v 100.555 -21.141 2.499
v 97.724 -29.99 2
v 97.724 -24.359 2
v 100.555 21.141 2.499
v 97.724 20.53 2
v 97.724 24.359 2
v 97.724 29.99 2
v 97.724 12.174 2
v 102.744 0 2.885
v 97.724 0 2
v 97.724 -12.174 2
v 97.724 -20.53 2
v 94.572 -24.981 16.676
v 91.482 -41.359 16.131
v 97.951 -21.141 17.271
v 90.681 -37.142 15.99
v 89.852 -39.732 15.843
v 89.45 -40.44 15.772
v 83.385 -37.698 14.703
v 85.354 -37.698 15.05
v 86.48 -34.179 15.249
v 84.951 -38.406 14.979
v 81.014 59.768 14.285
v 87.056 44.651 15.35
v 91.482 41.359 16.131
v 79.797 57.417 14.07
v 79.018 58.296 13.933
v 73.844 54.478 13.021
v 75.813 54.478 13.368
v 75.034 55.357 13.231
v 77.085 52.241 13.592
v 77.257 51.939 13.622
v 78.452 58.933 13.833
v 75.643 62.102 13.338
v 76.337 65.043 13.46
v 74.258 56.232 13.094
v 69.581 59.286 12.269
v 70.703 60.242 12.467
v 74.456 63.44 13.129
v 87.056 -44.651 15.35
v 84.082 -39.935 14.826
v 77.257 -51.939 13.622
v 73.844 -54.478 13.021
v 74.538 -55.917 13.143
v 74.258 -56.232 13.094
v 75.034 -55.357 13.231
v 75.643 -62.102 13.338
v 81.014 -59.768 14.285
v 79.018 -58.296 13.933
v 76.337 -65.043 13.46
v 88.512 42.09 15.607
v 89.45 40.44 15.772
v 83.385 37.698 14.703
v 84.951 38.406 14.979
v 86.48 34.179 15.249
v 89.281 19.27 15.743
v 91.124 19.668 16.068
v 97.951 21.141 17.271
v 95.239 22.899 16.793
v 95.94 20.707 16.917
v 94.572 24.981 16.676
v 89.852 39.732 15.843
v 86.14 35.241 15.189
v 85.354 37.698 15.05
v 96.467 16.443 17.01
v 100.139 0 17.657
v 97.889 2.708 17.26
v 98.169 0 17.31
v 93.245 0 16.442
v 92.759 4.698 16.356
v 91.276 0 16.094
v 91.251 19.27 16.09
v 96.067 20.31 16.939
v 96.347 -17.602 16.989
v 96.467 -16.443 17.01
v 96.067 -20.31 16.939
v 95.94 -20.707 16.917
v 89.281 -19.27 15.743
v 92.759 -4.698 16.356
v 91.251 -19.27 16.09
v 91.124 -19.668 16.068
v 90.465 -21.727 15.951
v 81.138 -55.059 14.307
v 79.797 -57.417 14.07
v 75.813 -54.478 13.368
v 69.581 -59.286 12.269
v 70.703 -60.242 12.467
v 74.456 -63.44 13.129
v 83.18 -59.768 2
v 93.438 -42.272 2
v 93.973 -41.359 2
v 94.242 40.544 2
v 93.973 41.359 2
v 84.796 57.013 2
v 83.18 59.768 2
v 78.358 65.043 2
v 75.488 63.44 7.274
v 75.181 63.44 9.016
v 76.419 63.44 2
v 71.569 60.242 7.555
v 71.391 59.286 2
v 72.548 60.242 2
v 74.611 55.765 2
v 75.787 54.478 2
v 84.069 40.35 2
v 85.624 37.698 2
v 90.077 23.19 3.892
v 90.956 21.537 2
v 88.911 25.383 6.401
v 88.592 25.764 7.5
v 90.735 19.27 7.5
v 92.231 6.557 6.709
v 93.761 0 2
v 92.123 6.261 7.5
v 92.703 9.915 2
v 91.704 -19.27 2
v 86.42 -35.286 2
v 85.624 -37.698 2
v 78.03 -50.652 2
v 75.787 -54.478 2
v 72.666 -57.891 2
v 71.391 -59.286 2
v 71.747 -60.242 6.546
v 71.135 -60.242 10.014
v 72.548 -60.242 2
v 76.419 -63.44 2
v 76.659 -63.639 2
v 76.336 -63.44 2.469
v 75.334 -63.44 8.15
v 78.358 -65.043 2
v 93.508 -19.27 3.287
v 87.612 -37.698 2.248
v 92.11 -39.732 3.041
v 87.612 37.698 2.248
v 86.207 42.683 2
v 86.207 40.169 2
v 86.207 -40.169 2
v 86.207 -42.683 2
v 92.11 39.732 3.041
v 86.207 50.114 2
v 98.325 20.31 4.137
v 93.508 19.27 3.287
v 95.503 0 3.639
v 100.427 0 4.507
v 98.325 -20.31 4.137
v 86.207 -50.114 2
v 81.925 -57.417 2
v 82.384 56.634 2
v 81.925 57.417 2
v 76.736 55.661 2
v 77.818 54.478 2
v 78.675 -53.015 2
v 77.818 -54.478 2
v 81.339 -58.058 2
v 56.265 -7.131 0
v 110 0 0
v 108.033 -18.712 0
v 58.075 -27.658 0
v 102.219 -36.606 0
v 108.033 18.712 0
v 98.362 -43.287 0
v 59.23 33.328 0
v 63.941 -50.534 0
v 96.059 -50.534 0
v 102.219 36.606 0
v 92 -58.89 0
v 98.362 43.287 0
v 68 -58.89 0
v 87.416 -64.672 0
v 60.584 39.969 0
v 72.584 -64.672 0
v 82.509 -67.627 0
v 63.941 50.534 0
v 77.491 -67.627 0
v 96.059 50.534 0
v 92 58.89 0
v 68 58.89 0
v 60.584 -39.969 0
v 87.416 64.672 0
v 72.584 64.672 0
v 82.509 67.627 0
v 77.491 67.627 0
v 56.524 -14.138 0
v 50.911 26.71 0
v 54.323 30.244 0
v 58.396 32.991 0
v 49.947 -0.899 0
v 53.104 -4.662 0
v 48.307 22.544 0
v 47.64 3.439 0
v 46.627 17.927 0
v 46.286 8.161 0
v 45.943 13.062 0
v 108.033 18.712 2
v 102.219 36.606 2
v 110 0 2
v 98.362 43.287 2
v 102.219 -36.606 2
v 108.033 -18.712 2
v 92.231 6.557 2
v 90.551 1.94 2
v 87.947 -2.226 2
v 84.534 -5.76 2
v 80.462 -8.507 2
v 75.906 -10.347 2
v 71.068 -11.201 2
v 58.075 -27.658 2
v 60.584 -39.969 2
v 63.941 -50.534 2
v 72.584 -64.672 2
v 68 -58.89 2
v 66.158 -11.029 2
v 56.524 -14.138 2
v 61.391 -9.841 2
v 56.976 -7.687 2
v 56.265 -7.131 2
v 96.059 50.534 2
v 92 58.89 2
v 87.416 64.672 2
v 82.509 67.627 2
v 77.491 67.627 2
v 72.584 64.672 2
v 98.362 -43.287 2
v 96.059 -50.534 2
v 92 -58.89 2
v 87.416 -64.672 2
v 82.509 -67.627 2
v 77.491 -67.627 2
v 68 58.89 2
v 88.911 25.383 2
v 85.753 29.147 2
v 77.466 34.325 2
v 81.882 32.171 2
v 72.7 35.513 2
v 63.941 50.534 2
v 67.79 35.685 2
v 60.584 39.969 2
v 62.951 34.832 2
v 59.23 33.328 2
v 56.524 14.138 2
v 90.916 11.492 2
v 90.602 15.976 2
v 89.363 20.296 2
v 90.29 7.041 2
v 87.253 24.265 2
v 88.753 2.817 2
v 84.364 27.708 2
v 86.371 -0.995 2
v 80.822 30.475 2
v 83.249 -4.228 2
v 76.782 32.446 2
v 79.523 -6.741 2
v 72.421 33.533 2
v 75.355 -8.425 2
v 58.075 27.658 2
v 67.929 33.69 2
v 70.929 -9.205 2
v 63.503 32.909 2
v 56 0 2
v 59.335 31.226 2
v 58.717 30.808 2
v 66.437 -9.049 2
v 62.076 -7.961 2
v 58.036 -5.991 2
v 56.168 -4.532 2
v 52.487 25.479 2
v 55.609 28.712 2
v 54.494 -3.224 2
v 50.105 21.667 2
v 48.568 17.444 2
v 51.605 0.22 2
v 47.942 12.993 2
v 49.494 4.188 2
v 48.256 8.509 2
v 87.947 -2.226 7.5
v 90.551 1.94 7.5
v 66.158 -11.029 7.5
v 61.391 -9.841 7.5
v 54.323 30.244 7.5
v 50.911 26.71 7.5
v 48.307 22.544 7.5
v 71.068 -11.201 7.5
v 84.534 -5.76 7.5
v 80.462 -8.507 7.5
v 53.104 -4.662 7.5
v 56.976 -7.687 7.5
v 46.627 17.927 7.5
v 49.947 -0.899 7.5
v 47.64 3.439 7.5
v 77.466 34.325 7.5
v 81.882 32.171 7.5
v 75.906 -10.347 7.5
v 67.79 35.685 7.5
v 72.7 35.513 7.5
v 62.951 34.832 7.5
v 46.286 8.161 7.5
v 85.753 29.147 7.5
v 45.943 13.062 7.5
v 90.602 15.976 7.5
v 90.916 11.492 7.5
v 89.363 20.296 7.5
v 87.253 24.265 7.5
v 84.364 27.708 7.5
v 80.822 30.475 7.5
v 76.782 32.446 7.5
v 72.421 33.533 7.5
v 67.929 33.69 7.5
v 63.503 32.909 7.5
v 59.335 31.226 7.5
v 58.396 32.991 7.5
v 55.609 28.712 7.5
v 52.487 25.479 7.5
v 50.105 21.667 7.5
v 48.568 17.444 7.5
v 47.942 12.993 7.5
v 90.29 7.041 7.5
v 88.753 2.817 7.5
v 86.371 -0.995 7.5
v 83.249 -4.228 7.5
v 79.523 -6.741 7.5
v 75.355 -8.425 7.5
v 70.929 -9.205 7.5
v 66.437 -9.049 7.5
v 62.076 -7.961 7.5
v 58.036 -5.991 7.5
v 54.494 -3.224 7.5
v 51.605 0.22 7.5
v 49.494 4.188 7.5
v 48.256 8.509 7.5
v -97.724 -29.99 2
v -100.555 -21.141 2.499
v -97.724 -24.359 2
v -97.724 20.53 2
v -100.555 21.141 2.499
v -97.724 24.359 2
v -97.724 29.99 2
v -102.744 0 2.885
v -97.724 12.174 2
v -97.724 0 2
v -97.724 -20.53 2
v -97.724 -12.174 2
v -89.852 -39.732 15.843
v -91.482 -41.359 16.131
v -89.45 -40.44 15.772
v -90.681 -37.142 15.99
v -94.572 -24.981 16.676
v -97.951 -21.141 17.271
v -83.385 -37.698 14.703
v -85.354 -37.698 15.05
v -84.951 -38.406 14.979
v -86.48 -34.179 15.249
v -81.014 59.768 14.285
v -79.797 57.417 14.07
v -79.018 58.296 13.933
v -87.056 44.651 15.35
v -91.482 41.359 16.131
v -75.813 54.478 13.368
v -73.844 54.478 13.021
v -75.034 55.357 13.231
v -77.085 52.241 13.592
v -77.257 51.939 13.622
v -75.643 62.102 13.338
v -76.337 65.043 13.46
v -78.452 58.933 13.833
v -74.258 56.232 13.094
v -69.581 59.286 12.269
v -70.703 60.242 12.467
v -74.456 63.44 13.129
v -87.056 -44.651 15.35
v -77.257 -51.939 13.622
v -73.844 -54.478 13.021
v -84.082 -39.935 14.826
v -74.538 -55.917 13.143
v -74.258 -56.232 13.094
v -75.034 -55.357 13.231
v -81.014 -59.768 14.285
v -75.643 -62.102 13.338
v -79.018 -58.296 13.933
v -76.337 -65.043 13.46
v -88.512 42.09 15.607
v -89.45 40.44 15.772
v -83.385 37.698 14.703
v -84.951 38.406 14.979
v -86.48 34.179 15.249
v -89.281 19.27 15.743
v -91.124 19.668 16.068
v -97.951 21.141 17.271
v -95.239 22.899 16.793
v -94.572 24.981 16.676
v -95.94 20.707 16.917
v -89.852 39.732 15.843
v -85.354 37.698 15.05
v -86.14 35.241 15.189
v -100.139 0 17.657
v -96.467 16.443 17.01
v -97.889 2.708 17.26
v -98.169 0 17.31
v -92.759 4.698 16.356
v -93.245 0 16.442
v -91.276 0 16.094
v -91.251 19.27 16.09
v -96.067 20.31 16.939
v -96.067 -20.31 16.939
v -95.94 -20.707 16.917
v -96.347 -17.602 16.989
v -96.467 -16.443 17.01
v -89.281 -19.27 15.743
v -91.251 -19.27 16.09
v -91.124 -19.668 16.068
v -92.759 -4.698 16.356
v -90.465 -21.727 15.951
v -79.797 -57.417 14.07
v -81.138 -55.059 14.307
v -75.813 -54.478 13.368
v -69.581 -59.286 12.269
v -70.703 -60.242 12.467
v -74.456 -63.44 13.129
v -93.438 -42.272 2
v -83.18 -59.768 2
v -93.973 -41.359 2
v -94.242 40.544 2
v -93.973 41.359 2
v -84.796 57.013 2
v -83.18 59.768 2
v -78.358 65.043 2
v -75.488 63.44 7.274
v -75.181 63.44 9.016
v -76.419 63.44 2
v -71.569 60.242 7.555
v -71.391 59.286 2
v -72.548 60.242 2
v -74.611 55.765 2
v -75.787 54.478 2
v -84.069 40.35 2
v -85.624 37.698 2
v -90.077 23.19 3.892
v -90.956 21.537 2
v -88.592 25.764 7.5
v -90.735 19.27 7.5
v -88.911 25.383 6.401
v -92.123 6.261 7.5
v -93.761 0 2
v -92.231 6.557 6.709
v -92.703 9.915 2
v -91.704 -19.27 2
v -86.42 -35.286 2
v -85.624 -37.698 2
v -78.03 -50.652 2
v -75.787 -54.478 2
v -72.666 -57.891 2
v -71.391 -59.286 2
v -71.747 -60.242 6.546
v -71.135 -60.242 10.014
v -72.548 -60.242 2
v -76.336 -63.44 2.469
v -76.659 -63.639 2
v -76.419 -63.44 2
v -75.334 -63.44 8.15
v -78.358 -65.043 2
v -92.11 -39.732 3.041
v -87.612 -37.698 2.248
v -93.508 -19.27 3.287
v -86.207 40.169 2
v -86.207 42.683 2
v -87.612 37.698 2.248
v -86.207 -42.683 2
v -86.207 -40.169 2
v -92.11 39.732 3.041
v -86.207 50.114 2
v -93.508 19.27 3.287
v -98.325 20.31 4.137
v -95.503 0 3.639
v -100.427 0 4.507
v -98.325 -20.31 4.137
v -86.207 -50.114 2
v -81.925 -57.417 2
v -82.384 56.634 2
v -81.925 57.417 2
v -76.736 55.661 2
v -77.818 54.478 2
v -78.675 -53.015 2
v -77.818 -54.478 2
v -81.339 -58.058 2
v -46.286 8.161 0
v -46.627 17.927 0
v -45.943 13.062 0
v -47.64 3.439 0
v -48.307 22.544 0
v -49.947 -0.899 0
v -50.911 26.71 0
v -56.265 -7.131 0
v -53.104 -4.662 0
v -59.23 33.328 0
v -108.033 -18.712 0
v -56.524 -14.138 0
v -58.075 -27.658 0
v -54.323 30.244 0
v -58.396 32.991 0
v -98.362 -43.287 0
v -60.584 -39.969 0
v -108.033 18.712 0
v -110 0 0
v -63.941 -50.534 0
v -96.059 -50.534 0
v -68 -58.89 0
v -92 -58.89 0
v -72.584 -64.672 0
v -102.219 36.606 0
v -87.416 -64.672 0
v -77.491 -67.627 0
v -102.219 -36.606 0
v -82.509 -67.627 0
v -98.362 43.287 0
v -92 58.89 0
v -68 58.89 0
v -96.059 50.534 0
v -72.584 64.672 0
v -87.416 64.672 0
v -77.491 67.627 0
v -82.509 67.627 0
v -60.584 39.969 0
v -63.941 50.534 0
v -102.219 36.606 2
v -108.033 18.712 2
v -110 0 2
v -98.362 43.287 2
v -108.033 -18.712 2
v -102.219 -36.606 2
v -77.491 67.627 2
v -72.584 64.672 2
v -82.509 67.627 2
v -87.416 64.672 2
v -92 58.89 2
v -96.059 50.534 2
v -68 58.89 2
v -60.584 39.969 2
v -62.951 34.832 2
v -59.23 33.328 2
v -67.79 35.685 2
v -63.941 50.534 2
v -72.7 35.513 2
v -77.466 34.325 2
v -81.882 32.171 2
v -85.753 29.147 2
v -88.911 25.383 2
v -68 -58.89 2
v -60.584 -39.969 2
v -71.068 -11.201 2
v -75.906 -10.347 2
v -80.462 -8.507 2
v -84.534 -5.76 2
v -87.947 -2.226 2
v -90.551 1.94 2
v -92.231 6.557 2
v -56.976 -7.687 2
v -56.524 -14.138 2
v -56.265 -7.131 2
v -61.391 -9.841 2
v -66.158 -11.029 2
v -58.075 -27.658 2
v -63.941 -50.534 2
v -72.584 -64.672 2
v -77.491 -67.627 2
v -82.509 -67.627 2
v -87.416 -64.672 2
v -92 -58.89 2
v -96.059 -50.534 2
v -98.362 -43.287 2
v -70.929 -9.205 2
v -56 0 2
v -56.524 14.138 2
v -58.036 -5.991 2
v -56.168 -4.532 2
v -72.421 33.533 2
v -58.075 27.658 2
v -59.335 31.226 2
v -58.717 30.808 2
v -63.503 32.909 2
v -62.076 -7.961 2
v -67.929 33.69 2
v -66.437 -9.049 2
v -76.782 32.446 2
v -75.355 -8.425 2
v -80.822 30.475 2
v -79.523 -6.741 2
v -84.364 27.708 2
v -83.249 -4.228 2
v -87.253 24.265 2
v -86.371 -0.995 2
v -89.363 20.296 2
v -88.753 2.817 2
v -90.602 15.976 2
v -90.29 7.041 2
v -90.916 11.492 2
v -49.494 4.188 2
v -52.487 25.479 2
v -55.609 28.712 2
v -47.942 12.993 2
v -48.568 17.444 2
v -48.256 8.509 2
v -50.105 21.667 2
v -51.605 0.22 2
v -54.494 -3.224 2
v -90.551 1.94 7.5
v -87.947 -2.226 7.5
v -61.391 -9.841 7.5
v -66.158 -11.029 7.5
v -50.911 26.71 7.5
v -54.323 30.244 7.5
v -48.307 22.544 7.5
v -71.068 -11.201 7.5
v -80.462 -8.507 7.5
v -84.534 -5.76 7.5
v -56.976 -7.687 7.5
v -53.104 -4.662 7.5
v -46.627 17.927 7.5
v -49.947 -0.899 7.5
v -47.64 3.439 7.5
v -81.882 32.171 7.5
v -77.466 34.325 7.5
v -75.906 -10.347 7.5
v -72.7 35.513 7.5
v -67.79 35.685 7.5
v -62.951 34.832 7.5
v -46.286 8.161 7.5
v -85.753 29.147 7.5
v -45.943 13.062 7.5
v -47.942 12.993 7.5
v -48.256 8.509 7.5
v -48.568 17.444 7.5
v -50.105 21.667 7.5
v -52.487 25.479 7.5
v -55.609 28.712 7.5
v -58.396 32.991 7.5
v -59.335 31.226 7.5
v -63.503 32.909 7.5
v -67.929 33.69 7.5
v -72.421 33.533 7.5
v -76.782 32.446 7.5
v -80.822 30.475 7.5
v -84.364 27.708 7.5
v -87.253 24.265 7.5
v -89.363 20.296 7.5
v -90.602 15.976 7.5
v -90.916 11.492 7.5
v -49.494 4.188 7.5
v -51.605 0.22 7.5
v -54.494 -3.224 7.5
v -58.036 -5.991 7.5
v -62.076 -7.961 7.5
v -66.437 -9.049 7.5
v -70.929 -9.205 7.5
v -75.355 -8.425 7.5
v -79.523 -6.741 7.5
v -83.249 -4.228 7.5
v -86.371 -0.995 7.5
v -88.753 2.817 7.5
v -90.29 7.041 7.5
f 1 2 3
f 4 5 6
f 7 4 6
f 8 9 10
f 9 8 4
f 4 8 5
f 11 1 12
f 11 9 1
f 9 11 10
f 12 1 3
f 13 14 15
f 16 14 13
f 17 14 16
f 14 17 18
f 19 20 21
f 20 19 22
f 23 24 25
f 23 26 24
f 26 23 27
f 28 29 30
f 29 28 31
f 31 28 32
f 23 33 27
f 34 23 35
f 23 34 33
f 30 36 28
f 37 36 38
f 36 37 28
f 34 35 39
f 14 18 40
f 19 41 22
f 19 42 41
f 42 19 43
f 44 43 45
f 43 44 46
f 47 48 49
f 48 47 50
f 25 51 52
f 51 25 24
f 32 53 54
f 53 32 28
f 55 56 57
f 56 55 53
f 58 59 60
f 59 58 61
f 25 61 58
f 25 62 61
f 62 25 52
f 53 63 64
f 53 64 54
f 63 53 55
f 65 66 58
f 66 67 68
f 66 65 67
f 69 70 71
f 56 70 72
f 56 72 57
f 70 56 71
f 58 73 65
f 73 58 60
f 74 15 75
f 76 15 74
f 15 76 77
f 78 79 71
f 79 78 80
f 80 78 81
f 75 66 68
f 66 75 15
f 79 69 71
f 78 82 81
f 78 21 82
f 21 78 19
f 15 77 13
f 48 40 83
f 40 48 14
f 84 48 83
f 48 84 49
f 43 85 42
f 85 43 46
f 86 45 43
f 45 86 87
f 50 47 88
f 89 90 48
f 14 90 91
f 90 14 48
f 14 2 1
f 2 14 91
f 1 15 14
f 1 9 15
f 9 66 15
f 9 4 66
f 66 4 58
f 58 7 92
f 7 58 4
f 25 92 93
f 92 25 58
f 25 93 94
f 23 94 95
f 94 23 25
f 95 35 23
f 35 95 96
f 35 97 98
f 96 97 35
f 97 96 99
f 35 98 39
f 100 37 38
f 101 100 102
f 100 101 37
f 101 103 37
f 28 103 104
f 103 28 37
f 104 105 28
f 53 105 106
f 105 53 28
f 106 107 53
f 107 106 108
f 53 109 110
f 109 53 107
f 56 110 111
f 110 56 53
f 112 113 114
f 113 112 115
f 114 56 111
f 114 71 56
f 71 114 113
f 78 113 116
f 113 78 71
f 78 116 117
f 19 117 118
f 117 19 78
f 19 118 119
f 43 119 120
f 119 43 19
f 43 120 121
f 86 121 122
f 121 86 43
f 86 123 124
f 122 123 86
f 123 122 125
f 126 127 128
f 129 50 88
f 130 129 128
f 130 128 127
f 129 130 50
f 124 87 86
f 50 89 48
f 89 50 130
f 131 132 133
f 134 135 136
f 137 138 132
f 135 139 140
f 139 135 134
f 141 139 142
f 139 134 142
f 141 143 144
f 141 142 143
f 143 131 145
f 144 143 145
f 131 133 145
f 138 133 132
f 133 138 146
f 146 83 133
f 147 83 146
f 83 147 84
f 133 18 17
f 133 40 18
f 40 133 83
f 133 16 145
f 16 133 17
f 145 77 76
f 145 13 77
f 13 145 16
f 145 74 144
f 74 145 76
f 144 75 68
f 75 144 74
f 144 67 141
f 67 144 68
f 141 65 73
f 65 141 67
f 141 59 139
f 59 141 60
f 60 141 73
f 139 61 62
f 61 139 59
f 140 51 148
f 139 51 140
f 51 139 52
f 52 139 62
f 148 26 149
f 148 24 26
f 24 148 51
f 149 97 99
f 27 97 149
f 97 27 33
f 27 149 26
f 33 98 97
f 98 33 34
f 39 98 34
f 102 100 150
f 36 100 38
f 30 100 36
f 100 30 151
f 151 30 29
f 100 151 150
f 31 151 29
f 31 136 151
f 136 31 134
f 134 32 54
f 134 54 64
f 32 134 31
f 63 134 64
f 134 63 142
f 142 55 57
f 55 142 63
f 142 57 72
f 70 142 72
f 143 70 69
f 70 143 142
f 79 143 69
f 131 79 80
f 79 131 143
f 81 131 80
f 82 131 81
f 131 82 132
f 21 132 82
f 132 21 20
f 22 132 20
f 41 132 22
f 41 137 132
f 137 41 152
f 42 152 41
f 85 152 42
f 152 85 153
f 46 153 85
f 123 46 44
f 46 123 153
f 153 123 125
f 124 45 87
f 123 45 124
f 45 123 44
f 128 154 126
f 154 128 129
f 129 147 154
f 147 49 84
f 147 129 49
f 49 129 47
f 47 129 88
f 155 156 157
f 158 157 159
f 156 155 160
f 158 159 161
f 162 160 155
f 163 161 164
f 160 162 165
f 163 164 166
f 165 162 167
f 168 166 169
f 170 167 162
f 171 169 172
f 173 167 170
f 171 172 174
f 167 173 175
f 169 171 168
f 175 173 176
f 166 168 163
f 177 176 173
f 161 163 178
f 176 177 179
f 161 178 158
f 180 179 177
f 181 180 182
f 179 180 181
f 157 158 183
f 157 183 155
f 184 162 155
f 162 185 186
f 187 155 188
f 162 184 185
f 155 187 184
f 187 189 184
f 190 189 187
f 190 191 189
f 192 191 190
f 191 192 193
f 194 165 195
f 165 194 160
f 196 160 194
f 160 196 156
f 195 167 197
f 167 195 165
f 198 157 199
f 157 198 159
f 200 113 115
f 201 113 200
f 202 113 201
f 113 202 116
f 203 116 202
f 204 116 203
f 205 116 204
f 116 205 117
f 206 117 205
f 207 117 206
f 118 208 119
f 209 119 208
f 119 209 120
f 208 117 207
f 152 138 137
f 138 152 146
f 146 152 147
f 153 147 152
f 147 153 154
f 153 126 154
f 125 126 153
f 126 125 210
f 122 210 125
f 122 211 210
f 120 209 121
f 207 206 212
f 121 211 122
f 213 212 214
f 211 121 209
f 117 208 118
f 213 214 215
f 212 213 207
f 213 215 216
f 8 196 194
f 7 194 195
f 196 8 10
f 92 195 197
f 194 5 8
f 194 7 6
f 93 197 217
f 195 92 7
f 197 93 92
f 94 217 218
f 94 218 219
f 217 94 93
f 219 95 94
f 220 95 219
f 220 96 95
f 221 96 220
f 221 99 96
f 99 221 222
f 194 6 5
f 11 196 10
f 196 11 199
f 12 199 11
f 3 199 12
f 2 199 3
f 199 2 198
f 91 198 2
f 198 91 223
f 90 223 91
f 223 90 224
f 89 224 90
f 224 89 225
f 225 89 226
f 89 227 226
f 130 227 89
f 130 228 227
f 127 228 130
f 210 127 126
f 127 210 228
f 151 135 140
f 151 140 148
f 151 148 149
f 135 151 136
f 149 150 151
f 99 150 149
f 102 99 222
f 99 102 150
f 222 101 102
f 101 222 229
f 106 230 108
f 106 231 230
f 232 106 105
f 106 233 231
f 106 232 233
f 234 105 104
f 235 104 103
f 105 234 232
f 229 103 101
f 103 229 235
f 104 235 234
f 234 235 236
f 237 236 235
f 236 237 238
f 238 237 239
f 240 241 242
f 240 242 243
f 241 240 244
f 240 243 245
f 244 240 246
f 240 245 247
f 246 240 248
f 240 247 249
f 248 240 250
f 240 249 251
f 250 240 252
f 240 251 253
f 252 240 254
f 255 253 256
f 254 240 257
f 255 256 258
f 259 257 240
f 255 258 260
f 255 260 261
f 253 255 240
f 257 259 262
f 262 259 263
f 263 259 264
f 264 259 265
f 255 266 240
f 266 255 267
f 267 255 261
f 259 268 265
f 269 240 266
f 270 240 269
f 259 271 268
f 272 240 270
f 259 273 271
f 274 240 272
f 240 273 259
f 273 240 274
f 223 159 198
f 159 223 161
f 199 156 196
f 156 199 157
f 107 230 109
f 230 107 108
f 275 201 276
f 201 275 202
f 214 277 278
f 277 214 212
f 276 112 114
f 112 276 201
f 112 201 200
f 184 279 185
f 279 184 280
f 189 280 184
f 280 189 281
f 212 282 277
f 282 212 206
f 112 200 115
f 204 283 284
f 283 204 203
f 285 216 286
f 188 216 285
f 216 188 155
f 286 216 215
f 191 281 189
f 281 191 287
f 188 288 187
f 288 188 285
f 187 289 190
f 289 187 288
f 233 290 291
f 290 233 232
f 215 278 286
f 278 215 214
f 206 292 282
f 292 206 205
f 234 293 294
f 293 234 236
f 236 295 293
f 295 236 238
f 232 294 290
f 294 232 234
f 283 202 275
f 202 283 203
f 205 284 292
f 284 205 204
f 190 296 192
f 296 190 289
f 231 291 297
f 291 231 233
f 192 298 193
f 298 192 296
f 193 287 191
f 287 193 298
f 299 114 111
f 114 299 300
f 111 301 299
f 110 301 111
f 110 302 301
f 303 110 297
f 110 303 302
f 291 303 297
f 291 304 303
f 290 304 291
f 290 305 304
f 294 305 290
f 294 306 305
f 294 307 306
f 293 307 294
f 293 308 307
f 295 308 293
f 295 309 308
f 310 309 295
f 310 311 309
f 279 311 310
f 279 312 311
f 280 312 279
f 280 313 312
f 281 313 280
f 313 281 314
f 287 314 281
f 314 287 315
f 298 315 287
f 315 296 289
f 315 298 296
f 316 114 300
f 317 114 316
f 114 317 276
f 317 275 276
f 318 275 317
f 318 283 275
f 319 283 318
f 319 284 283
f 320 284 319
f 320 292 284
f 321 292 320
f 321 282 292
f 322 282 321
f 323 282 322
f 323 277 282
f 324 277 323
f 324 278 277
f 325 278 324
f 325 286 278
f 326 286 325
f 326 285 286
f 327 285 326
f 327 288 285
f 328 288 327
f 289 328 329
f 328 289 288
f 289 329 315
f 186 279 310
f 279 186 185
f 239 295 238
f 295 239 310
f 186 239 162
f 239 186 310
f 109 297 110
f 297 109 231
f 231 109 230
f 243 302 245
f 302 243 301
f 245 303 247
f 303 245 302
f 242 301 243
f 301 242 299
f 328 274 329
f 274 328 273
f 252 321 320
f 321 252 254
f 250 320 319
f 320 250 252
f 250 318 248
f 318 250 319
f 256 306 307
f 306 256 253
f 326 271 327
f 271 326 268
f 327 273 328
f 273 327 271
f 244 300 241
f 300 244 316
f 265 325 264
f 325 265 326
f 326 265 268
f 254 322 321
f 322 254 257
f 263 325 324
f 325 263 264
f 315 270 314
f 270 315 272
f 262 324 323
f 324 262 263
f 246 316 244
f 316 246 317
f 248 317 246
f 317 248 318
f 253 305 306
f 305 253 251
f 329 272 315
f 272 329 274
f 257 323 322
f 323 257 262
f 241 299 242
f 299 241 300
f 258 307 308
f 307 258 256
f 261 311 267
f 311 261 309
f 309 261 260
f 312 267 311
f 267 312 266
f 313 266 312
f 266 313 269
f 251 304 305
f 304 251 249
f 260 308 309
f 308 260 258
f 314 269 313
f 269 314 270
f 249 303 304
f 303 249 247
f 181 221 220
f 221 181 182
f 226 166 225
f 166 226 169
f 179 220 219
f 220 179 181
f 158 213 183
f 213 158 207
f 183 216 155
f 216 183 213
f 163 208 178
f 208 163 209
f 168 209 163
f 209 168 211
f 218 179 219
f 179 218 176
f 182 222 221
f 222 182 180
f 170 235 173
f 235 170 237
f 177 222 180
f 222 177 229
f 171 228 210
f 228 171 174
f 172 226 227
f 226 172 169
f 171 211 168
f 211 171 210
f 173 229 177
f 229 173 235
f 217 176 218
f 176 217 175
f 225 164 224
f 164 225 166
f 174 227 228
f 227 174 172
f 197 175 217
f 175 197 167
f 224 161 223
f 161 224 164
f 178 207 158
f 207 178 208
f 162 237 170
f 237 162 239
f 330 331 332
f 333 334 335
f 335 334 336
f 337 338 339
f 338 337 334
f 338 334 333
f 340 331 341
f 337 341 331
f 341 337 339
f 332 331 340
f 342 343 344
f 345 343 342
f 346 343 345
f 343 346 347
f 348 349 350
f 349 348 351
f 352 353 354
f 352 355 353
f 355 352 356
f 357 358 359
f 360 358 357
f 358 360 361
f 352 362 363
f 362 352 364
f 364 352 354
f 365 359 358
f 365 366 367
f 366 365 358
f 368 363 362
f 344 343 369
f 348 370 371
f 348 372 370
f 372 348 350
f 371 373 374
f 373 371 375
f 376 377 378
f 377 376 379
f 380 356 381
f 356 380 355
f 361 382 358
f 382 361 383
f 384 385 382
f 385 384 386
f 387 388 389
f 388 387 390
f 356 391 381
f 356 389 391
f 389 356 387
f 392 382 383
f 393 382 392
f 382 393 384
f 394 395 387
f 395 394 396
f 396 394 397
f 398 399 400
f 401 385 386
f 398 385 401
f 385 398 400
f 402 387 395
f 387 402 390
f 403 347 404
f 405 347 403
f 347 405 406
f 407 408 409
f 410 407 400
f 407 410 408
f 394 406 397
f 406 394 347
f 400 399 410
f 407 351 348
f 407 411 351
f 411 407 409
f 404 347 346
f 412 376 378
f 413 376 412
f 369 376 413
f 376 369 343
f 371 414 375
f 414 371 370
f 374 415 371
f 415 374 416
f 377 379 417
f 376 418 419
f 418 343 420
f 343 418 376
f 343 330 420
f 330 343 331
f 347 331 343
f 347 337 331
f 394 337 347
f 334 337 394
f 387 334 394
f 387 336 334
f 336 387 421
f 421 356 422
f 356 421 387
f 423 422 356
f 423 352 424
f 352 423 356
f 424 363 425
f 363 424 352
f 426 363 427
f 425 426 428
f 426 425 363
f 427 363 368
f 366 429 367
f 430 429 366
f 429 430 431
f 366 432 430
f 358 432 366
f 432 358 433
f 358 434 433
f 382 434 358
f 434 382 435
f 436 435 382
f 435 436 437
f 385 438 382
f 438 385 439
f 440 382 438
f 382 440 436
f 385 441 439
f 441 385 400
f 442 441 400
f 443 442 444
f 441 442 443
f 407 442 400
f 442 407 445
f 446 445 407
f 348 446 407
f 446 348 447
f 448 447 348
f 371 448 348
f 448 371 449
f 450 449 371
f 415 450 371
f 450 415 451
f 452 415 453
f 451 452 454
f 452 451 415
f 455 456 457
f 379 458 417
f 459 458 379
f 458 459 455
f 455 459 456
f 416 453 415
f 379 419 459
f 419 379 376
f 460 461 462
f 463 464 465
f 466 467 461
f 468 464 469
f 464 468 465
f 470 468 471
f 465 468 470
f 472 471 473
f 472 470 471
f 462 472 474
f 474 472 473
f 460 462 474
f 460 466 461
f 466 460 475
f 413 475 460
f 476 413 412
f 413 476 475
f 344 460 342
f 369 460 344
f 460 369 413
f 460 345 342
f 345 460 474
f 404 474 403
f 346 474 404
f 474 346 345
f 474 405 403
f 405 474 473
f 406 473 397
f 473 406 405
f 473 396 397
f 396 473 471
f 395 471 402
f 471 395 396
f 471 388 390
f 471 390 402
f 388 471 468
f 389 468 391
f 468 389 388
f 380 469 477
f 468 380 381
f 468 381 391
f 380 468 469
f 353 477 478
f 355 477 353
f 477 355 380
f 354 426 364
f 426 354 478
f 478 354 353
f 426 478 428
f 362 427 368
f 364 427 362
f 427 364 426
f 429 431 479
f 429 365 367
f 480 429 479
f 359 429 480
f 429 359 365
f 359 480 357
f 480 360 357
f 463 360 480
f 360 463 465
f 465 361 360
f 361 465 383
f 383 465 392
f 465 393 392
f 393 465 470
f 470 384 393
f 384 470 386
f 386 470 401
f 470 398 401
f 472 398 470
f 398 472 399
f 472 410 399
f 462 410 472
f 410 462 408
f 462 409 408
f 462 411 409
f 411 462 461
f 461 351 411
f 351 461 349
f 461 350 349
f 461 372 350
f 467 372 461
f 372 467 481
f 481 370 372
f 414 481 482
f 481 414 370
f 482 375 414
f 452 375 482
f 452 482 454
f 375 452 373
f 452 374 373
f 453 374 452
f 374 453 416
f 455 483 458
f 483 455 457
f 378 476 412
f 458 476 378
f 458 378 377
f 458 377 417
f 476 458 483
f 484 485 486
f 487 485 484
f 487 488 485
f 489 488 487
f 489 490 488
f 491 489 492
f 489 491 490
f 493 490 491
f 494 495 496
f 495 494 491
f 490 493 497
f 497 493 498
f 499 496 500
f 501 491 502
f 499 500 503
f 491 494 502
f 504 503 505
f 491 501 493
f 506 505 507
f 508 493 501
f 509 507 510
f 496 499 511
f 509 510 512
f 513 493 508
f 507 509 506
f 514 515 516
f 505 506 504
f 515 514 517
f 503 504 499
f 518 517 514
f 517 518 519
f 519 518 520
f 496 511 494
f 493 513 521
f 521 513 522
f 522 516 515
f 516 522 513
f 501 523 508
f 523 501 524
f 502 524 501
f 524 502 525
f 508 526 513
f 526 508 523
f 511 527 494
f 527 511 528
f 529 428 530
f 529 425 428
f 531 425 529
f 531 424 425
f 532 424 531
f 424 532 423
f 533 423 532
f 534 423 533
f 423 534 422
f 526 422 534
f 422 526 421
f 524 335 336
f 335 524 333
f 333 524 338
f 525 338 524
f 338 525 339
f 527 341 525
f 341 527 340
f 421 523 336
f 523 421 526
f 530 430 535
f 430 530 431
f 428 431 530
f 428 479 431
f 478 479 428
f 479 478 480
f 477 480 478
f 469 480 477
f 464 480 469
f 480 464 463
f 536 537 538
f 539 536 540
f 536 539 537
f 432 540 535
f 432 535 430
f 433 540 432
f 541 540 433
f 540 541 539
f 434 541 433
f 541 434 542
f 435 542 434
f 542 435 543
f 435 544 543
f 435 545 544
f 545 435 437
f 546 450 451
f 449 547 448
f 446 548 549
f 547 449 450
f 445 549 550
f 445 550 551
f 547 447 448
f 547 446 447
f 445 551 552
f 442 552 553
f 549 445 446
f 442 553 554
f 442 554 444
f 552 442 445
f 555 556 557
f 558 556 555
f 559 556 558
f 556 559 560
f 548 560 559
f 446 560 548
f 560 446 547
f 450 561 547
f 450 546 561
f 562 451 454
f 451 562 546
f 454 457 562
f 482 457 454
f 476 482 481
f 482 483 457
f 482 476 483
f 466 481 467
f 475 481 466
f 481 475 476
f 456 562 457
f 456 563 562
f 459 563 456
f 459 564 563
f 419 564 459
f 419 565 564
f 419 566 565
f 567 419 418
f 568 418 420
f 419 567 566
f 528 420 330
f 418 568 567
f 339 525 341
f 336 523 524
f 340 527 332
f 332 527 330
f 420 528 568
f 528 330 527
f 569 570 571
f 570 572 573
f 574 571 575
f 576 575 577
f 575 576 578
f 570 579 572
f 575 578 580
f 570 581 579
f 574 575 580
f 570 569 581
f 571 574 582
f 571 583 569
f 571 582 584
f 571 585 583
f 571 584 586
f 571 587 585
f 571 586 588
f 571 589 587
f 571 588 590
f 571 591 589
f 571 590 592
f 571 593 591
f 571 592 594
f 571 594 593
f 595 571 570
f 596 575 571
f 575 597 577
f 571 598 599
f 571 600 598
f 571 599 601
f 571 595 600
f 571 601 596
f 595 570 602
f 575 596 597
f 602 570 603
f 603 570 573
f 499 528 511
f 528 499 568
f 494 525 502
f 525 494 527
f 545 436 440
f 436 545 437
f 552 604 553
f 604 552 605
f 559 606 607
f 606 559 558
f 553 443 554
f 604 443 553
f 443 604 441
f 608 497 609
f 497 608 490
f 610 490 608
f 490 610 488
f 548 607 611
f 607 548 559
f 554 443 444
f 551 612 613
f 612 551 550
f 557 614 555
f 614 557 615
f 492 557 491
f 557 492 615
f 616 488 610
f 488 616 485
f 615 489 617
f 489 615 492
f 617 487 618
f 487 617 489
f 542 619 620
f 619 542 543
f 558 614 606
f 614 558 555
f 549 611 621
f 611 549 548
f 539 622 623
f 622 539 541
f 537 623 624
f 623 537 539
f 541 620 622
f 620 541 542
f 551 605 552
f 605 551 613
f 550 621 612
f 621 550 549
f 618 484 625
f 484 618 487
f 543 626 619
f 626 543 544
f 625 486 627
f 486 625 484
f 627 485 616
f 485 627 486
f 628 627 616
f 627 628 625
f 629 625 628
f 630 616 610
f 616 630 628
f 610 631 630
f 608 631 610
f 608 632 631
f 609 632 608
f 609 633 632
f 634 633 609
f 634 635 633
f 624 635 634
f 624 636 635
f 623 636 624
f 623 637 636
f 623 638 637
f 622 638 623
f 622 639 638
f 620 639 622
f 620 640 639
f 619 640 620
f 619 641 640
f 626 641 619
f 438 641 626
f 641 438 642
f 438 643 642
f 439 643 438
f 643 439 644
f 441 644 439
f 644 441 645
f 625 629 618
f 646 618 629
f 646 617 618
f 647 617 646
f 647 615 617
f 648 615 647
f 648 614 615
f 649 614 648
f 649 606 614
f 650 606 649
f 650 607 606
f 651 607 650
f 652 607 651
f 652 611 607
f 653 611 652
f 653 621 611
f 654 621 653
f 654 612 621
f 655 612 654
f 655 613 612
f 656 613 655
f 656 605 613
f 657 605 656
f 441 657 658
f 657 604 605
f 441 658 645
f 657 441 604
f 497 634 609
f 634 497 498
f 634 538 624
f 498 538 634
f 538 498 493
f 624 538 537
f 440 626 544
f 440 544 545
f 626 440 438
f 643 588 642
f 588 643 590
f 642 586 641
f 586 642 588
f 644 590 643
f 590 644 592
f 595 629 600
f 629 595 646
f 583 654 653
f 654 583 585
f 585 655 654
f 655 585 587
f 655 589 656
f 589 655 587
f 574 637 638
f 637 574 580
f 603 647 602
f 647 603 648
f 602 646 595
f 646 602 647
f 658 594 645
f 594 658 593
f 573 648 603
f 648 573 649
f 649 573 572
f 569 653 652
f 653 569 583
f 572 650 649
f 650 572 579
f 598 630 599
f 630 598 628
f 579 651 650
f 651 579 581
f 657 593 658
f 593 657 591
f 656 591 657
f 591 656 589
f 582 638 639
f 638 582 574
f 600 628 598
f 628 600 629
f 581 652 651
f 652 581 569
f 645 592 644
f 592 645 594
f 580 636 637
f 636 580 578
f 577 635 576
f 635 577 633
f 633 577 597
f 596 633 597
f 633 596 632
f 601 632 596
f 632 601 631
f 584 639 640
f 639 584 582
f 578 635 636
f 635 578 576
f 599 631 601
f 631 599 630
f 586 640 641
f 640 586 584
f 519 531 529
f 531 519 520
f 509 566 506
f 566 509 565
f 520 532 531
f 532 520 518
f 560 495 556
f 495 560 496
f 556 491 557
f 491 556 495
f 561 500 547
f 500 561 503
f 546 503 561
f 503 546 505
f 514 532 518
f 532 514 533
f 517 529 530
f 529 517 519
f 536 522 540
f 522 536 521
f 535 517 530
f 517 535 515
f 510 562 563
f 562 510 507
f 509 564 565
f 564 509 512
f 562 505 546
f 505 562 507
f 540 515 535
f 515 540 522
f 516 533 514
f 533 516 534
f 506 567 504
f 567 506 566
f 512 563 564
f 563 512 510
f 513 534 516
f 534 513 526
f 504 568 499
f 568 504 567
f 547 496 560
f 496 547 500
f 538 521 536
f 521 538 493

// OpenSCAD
arc_w = 107;
arc_h = 17;

radius = (arc_h / 2) + (arc_w * arc_w) / (8 * arc_h);
angle = -10;

pod = 40;
under = 10;
sole = 2;
well = 15;
wall = 2;
toe = 5;
heel = 15;

foot = 43 + wall*2;

mirror() shoe();
shoe();

module shoe() {
    difference() {
        union () {
            difference () {      
                rotate([0, angle, 0]) {
                    translate([0, 0, -well]) { linear_extrude(well) { arc(radius, wall*2+toe, 80); } }
                }
                rotate([0, angle, 0]) {
                    translate([wall, 0, sole-well]) { linear_extrude(well) { arc(radius, toe, 90); } }
                }
                
                translate([pod-20, 0, -under]) { linear_extrude(under) { circle(90, 0, 0); } }
            }
            
            translate([pod-20, 0, 0]) { linear_extrude(sole) { circle(90, 0, 0); } }
        }
        translate([0, 0, -1]) { linear_extrude(sole+2) { circle(90, 0, 0); } }
        translate([0,-pod*3,-1]) { cube([pod*2,pod*6,sole+1]); }
    }

    rotate([0,0,10]) {
        translate([pod+foot/2+arc_h-heel+toe, 0, 0]) {
            difference() {
                linear_extrude(well/2) { circle(foot/2); }
                translate([0, 0, sole]) { linear_extrude(well) { circle(foot/2-wall); } }
            }
        }
    }

    translate([pod*2, 0, 0]) { linear_extrude(sole) { scale([.6, 1.7]) { circle(pod); } } }
}


module arc(radius, thick, angle){
	intersection(){
		union(){
			rights = floor(angle/90);
			remain = angle-rights*90;
			if(angle > 90){
				for(i = [0:rights-1]){
					rotate(i*90-(rights-1)*90/2){
						polygon([[0, 0], [radius+thick, (radius+thick)*tan(90/2)], [radius+thick, -(radius+thick)*tan(90/2)]]);
					}
				}
				rotate(-(rights)*90/2)
					polygon([[0, 0], [radius+thick, 0], [radius+thick, -(radius+thick)*tan(remain/2)]]);
				rotate((rights)*90/2)
					polygon([[0, 0], [radius+thick, (radius+thick)*tan(remain/2)], [radius+thick, 0]]);
			}else{
				polygon([[0, 0], [radius+thick, (radius+thick)*tan(angle/2)], [radius+thick, -(radius+thick)*tan(angle/2)]]);
			}
		}
		difference(){
			circle(radius+thick);
			circle(radius);
		}
	}
}
